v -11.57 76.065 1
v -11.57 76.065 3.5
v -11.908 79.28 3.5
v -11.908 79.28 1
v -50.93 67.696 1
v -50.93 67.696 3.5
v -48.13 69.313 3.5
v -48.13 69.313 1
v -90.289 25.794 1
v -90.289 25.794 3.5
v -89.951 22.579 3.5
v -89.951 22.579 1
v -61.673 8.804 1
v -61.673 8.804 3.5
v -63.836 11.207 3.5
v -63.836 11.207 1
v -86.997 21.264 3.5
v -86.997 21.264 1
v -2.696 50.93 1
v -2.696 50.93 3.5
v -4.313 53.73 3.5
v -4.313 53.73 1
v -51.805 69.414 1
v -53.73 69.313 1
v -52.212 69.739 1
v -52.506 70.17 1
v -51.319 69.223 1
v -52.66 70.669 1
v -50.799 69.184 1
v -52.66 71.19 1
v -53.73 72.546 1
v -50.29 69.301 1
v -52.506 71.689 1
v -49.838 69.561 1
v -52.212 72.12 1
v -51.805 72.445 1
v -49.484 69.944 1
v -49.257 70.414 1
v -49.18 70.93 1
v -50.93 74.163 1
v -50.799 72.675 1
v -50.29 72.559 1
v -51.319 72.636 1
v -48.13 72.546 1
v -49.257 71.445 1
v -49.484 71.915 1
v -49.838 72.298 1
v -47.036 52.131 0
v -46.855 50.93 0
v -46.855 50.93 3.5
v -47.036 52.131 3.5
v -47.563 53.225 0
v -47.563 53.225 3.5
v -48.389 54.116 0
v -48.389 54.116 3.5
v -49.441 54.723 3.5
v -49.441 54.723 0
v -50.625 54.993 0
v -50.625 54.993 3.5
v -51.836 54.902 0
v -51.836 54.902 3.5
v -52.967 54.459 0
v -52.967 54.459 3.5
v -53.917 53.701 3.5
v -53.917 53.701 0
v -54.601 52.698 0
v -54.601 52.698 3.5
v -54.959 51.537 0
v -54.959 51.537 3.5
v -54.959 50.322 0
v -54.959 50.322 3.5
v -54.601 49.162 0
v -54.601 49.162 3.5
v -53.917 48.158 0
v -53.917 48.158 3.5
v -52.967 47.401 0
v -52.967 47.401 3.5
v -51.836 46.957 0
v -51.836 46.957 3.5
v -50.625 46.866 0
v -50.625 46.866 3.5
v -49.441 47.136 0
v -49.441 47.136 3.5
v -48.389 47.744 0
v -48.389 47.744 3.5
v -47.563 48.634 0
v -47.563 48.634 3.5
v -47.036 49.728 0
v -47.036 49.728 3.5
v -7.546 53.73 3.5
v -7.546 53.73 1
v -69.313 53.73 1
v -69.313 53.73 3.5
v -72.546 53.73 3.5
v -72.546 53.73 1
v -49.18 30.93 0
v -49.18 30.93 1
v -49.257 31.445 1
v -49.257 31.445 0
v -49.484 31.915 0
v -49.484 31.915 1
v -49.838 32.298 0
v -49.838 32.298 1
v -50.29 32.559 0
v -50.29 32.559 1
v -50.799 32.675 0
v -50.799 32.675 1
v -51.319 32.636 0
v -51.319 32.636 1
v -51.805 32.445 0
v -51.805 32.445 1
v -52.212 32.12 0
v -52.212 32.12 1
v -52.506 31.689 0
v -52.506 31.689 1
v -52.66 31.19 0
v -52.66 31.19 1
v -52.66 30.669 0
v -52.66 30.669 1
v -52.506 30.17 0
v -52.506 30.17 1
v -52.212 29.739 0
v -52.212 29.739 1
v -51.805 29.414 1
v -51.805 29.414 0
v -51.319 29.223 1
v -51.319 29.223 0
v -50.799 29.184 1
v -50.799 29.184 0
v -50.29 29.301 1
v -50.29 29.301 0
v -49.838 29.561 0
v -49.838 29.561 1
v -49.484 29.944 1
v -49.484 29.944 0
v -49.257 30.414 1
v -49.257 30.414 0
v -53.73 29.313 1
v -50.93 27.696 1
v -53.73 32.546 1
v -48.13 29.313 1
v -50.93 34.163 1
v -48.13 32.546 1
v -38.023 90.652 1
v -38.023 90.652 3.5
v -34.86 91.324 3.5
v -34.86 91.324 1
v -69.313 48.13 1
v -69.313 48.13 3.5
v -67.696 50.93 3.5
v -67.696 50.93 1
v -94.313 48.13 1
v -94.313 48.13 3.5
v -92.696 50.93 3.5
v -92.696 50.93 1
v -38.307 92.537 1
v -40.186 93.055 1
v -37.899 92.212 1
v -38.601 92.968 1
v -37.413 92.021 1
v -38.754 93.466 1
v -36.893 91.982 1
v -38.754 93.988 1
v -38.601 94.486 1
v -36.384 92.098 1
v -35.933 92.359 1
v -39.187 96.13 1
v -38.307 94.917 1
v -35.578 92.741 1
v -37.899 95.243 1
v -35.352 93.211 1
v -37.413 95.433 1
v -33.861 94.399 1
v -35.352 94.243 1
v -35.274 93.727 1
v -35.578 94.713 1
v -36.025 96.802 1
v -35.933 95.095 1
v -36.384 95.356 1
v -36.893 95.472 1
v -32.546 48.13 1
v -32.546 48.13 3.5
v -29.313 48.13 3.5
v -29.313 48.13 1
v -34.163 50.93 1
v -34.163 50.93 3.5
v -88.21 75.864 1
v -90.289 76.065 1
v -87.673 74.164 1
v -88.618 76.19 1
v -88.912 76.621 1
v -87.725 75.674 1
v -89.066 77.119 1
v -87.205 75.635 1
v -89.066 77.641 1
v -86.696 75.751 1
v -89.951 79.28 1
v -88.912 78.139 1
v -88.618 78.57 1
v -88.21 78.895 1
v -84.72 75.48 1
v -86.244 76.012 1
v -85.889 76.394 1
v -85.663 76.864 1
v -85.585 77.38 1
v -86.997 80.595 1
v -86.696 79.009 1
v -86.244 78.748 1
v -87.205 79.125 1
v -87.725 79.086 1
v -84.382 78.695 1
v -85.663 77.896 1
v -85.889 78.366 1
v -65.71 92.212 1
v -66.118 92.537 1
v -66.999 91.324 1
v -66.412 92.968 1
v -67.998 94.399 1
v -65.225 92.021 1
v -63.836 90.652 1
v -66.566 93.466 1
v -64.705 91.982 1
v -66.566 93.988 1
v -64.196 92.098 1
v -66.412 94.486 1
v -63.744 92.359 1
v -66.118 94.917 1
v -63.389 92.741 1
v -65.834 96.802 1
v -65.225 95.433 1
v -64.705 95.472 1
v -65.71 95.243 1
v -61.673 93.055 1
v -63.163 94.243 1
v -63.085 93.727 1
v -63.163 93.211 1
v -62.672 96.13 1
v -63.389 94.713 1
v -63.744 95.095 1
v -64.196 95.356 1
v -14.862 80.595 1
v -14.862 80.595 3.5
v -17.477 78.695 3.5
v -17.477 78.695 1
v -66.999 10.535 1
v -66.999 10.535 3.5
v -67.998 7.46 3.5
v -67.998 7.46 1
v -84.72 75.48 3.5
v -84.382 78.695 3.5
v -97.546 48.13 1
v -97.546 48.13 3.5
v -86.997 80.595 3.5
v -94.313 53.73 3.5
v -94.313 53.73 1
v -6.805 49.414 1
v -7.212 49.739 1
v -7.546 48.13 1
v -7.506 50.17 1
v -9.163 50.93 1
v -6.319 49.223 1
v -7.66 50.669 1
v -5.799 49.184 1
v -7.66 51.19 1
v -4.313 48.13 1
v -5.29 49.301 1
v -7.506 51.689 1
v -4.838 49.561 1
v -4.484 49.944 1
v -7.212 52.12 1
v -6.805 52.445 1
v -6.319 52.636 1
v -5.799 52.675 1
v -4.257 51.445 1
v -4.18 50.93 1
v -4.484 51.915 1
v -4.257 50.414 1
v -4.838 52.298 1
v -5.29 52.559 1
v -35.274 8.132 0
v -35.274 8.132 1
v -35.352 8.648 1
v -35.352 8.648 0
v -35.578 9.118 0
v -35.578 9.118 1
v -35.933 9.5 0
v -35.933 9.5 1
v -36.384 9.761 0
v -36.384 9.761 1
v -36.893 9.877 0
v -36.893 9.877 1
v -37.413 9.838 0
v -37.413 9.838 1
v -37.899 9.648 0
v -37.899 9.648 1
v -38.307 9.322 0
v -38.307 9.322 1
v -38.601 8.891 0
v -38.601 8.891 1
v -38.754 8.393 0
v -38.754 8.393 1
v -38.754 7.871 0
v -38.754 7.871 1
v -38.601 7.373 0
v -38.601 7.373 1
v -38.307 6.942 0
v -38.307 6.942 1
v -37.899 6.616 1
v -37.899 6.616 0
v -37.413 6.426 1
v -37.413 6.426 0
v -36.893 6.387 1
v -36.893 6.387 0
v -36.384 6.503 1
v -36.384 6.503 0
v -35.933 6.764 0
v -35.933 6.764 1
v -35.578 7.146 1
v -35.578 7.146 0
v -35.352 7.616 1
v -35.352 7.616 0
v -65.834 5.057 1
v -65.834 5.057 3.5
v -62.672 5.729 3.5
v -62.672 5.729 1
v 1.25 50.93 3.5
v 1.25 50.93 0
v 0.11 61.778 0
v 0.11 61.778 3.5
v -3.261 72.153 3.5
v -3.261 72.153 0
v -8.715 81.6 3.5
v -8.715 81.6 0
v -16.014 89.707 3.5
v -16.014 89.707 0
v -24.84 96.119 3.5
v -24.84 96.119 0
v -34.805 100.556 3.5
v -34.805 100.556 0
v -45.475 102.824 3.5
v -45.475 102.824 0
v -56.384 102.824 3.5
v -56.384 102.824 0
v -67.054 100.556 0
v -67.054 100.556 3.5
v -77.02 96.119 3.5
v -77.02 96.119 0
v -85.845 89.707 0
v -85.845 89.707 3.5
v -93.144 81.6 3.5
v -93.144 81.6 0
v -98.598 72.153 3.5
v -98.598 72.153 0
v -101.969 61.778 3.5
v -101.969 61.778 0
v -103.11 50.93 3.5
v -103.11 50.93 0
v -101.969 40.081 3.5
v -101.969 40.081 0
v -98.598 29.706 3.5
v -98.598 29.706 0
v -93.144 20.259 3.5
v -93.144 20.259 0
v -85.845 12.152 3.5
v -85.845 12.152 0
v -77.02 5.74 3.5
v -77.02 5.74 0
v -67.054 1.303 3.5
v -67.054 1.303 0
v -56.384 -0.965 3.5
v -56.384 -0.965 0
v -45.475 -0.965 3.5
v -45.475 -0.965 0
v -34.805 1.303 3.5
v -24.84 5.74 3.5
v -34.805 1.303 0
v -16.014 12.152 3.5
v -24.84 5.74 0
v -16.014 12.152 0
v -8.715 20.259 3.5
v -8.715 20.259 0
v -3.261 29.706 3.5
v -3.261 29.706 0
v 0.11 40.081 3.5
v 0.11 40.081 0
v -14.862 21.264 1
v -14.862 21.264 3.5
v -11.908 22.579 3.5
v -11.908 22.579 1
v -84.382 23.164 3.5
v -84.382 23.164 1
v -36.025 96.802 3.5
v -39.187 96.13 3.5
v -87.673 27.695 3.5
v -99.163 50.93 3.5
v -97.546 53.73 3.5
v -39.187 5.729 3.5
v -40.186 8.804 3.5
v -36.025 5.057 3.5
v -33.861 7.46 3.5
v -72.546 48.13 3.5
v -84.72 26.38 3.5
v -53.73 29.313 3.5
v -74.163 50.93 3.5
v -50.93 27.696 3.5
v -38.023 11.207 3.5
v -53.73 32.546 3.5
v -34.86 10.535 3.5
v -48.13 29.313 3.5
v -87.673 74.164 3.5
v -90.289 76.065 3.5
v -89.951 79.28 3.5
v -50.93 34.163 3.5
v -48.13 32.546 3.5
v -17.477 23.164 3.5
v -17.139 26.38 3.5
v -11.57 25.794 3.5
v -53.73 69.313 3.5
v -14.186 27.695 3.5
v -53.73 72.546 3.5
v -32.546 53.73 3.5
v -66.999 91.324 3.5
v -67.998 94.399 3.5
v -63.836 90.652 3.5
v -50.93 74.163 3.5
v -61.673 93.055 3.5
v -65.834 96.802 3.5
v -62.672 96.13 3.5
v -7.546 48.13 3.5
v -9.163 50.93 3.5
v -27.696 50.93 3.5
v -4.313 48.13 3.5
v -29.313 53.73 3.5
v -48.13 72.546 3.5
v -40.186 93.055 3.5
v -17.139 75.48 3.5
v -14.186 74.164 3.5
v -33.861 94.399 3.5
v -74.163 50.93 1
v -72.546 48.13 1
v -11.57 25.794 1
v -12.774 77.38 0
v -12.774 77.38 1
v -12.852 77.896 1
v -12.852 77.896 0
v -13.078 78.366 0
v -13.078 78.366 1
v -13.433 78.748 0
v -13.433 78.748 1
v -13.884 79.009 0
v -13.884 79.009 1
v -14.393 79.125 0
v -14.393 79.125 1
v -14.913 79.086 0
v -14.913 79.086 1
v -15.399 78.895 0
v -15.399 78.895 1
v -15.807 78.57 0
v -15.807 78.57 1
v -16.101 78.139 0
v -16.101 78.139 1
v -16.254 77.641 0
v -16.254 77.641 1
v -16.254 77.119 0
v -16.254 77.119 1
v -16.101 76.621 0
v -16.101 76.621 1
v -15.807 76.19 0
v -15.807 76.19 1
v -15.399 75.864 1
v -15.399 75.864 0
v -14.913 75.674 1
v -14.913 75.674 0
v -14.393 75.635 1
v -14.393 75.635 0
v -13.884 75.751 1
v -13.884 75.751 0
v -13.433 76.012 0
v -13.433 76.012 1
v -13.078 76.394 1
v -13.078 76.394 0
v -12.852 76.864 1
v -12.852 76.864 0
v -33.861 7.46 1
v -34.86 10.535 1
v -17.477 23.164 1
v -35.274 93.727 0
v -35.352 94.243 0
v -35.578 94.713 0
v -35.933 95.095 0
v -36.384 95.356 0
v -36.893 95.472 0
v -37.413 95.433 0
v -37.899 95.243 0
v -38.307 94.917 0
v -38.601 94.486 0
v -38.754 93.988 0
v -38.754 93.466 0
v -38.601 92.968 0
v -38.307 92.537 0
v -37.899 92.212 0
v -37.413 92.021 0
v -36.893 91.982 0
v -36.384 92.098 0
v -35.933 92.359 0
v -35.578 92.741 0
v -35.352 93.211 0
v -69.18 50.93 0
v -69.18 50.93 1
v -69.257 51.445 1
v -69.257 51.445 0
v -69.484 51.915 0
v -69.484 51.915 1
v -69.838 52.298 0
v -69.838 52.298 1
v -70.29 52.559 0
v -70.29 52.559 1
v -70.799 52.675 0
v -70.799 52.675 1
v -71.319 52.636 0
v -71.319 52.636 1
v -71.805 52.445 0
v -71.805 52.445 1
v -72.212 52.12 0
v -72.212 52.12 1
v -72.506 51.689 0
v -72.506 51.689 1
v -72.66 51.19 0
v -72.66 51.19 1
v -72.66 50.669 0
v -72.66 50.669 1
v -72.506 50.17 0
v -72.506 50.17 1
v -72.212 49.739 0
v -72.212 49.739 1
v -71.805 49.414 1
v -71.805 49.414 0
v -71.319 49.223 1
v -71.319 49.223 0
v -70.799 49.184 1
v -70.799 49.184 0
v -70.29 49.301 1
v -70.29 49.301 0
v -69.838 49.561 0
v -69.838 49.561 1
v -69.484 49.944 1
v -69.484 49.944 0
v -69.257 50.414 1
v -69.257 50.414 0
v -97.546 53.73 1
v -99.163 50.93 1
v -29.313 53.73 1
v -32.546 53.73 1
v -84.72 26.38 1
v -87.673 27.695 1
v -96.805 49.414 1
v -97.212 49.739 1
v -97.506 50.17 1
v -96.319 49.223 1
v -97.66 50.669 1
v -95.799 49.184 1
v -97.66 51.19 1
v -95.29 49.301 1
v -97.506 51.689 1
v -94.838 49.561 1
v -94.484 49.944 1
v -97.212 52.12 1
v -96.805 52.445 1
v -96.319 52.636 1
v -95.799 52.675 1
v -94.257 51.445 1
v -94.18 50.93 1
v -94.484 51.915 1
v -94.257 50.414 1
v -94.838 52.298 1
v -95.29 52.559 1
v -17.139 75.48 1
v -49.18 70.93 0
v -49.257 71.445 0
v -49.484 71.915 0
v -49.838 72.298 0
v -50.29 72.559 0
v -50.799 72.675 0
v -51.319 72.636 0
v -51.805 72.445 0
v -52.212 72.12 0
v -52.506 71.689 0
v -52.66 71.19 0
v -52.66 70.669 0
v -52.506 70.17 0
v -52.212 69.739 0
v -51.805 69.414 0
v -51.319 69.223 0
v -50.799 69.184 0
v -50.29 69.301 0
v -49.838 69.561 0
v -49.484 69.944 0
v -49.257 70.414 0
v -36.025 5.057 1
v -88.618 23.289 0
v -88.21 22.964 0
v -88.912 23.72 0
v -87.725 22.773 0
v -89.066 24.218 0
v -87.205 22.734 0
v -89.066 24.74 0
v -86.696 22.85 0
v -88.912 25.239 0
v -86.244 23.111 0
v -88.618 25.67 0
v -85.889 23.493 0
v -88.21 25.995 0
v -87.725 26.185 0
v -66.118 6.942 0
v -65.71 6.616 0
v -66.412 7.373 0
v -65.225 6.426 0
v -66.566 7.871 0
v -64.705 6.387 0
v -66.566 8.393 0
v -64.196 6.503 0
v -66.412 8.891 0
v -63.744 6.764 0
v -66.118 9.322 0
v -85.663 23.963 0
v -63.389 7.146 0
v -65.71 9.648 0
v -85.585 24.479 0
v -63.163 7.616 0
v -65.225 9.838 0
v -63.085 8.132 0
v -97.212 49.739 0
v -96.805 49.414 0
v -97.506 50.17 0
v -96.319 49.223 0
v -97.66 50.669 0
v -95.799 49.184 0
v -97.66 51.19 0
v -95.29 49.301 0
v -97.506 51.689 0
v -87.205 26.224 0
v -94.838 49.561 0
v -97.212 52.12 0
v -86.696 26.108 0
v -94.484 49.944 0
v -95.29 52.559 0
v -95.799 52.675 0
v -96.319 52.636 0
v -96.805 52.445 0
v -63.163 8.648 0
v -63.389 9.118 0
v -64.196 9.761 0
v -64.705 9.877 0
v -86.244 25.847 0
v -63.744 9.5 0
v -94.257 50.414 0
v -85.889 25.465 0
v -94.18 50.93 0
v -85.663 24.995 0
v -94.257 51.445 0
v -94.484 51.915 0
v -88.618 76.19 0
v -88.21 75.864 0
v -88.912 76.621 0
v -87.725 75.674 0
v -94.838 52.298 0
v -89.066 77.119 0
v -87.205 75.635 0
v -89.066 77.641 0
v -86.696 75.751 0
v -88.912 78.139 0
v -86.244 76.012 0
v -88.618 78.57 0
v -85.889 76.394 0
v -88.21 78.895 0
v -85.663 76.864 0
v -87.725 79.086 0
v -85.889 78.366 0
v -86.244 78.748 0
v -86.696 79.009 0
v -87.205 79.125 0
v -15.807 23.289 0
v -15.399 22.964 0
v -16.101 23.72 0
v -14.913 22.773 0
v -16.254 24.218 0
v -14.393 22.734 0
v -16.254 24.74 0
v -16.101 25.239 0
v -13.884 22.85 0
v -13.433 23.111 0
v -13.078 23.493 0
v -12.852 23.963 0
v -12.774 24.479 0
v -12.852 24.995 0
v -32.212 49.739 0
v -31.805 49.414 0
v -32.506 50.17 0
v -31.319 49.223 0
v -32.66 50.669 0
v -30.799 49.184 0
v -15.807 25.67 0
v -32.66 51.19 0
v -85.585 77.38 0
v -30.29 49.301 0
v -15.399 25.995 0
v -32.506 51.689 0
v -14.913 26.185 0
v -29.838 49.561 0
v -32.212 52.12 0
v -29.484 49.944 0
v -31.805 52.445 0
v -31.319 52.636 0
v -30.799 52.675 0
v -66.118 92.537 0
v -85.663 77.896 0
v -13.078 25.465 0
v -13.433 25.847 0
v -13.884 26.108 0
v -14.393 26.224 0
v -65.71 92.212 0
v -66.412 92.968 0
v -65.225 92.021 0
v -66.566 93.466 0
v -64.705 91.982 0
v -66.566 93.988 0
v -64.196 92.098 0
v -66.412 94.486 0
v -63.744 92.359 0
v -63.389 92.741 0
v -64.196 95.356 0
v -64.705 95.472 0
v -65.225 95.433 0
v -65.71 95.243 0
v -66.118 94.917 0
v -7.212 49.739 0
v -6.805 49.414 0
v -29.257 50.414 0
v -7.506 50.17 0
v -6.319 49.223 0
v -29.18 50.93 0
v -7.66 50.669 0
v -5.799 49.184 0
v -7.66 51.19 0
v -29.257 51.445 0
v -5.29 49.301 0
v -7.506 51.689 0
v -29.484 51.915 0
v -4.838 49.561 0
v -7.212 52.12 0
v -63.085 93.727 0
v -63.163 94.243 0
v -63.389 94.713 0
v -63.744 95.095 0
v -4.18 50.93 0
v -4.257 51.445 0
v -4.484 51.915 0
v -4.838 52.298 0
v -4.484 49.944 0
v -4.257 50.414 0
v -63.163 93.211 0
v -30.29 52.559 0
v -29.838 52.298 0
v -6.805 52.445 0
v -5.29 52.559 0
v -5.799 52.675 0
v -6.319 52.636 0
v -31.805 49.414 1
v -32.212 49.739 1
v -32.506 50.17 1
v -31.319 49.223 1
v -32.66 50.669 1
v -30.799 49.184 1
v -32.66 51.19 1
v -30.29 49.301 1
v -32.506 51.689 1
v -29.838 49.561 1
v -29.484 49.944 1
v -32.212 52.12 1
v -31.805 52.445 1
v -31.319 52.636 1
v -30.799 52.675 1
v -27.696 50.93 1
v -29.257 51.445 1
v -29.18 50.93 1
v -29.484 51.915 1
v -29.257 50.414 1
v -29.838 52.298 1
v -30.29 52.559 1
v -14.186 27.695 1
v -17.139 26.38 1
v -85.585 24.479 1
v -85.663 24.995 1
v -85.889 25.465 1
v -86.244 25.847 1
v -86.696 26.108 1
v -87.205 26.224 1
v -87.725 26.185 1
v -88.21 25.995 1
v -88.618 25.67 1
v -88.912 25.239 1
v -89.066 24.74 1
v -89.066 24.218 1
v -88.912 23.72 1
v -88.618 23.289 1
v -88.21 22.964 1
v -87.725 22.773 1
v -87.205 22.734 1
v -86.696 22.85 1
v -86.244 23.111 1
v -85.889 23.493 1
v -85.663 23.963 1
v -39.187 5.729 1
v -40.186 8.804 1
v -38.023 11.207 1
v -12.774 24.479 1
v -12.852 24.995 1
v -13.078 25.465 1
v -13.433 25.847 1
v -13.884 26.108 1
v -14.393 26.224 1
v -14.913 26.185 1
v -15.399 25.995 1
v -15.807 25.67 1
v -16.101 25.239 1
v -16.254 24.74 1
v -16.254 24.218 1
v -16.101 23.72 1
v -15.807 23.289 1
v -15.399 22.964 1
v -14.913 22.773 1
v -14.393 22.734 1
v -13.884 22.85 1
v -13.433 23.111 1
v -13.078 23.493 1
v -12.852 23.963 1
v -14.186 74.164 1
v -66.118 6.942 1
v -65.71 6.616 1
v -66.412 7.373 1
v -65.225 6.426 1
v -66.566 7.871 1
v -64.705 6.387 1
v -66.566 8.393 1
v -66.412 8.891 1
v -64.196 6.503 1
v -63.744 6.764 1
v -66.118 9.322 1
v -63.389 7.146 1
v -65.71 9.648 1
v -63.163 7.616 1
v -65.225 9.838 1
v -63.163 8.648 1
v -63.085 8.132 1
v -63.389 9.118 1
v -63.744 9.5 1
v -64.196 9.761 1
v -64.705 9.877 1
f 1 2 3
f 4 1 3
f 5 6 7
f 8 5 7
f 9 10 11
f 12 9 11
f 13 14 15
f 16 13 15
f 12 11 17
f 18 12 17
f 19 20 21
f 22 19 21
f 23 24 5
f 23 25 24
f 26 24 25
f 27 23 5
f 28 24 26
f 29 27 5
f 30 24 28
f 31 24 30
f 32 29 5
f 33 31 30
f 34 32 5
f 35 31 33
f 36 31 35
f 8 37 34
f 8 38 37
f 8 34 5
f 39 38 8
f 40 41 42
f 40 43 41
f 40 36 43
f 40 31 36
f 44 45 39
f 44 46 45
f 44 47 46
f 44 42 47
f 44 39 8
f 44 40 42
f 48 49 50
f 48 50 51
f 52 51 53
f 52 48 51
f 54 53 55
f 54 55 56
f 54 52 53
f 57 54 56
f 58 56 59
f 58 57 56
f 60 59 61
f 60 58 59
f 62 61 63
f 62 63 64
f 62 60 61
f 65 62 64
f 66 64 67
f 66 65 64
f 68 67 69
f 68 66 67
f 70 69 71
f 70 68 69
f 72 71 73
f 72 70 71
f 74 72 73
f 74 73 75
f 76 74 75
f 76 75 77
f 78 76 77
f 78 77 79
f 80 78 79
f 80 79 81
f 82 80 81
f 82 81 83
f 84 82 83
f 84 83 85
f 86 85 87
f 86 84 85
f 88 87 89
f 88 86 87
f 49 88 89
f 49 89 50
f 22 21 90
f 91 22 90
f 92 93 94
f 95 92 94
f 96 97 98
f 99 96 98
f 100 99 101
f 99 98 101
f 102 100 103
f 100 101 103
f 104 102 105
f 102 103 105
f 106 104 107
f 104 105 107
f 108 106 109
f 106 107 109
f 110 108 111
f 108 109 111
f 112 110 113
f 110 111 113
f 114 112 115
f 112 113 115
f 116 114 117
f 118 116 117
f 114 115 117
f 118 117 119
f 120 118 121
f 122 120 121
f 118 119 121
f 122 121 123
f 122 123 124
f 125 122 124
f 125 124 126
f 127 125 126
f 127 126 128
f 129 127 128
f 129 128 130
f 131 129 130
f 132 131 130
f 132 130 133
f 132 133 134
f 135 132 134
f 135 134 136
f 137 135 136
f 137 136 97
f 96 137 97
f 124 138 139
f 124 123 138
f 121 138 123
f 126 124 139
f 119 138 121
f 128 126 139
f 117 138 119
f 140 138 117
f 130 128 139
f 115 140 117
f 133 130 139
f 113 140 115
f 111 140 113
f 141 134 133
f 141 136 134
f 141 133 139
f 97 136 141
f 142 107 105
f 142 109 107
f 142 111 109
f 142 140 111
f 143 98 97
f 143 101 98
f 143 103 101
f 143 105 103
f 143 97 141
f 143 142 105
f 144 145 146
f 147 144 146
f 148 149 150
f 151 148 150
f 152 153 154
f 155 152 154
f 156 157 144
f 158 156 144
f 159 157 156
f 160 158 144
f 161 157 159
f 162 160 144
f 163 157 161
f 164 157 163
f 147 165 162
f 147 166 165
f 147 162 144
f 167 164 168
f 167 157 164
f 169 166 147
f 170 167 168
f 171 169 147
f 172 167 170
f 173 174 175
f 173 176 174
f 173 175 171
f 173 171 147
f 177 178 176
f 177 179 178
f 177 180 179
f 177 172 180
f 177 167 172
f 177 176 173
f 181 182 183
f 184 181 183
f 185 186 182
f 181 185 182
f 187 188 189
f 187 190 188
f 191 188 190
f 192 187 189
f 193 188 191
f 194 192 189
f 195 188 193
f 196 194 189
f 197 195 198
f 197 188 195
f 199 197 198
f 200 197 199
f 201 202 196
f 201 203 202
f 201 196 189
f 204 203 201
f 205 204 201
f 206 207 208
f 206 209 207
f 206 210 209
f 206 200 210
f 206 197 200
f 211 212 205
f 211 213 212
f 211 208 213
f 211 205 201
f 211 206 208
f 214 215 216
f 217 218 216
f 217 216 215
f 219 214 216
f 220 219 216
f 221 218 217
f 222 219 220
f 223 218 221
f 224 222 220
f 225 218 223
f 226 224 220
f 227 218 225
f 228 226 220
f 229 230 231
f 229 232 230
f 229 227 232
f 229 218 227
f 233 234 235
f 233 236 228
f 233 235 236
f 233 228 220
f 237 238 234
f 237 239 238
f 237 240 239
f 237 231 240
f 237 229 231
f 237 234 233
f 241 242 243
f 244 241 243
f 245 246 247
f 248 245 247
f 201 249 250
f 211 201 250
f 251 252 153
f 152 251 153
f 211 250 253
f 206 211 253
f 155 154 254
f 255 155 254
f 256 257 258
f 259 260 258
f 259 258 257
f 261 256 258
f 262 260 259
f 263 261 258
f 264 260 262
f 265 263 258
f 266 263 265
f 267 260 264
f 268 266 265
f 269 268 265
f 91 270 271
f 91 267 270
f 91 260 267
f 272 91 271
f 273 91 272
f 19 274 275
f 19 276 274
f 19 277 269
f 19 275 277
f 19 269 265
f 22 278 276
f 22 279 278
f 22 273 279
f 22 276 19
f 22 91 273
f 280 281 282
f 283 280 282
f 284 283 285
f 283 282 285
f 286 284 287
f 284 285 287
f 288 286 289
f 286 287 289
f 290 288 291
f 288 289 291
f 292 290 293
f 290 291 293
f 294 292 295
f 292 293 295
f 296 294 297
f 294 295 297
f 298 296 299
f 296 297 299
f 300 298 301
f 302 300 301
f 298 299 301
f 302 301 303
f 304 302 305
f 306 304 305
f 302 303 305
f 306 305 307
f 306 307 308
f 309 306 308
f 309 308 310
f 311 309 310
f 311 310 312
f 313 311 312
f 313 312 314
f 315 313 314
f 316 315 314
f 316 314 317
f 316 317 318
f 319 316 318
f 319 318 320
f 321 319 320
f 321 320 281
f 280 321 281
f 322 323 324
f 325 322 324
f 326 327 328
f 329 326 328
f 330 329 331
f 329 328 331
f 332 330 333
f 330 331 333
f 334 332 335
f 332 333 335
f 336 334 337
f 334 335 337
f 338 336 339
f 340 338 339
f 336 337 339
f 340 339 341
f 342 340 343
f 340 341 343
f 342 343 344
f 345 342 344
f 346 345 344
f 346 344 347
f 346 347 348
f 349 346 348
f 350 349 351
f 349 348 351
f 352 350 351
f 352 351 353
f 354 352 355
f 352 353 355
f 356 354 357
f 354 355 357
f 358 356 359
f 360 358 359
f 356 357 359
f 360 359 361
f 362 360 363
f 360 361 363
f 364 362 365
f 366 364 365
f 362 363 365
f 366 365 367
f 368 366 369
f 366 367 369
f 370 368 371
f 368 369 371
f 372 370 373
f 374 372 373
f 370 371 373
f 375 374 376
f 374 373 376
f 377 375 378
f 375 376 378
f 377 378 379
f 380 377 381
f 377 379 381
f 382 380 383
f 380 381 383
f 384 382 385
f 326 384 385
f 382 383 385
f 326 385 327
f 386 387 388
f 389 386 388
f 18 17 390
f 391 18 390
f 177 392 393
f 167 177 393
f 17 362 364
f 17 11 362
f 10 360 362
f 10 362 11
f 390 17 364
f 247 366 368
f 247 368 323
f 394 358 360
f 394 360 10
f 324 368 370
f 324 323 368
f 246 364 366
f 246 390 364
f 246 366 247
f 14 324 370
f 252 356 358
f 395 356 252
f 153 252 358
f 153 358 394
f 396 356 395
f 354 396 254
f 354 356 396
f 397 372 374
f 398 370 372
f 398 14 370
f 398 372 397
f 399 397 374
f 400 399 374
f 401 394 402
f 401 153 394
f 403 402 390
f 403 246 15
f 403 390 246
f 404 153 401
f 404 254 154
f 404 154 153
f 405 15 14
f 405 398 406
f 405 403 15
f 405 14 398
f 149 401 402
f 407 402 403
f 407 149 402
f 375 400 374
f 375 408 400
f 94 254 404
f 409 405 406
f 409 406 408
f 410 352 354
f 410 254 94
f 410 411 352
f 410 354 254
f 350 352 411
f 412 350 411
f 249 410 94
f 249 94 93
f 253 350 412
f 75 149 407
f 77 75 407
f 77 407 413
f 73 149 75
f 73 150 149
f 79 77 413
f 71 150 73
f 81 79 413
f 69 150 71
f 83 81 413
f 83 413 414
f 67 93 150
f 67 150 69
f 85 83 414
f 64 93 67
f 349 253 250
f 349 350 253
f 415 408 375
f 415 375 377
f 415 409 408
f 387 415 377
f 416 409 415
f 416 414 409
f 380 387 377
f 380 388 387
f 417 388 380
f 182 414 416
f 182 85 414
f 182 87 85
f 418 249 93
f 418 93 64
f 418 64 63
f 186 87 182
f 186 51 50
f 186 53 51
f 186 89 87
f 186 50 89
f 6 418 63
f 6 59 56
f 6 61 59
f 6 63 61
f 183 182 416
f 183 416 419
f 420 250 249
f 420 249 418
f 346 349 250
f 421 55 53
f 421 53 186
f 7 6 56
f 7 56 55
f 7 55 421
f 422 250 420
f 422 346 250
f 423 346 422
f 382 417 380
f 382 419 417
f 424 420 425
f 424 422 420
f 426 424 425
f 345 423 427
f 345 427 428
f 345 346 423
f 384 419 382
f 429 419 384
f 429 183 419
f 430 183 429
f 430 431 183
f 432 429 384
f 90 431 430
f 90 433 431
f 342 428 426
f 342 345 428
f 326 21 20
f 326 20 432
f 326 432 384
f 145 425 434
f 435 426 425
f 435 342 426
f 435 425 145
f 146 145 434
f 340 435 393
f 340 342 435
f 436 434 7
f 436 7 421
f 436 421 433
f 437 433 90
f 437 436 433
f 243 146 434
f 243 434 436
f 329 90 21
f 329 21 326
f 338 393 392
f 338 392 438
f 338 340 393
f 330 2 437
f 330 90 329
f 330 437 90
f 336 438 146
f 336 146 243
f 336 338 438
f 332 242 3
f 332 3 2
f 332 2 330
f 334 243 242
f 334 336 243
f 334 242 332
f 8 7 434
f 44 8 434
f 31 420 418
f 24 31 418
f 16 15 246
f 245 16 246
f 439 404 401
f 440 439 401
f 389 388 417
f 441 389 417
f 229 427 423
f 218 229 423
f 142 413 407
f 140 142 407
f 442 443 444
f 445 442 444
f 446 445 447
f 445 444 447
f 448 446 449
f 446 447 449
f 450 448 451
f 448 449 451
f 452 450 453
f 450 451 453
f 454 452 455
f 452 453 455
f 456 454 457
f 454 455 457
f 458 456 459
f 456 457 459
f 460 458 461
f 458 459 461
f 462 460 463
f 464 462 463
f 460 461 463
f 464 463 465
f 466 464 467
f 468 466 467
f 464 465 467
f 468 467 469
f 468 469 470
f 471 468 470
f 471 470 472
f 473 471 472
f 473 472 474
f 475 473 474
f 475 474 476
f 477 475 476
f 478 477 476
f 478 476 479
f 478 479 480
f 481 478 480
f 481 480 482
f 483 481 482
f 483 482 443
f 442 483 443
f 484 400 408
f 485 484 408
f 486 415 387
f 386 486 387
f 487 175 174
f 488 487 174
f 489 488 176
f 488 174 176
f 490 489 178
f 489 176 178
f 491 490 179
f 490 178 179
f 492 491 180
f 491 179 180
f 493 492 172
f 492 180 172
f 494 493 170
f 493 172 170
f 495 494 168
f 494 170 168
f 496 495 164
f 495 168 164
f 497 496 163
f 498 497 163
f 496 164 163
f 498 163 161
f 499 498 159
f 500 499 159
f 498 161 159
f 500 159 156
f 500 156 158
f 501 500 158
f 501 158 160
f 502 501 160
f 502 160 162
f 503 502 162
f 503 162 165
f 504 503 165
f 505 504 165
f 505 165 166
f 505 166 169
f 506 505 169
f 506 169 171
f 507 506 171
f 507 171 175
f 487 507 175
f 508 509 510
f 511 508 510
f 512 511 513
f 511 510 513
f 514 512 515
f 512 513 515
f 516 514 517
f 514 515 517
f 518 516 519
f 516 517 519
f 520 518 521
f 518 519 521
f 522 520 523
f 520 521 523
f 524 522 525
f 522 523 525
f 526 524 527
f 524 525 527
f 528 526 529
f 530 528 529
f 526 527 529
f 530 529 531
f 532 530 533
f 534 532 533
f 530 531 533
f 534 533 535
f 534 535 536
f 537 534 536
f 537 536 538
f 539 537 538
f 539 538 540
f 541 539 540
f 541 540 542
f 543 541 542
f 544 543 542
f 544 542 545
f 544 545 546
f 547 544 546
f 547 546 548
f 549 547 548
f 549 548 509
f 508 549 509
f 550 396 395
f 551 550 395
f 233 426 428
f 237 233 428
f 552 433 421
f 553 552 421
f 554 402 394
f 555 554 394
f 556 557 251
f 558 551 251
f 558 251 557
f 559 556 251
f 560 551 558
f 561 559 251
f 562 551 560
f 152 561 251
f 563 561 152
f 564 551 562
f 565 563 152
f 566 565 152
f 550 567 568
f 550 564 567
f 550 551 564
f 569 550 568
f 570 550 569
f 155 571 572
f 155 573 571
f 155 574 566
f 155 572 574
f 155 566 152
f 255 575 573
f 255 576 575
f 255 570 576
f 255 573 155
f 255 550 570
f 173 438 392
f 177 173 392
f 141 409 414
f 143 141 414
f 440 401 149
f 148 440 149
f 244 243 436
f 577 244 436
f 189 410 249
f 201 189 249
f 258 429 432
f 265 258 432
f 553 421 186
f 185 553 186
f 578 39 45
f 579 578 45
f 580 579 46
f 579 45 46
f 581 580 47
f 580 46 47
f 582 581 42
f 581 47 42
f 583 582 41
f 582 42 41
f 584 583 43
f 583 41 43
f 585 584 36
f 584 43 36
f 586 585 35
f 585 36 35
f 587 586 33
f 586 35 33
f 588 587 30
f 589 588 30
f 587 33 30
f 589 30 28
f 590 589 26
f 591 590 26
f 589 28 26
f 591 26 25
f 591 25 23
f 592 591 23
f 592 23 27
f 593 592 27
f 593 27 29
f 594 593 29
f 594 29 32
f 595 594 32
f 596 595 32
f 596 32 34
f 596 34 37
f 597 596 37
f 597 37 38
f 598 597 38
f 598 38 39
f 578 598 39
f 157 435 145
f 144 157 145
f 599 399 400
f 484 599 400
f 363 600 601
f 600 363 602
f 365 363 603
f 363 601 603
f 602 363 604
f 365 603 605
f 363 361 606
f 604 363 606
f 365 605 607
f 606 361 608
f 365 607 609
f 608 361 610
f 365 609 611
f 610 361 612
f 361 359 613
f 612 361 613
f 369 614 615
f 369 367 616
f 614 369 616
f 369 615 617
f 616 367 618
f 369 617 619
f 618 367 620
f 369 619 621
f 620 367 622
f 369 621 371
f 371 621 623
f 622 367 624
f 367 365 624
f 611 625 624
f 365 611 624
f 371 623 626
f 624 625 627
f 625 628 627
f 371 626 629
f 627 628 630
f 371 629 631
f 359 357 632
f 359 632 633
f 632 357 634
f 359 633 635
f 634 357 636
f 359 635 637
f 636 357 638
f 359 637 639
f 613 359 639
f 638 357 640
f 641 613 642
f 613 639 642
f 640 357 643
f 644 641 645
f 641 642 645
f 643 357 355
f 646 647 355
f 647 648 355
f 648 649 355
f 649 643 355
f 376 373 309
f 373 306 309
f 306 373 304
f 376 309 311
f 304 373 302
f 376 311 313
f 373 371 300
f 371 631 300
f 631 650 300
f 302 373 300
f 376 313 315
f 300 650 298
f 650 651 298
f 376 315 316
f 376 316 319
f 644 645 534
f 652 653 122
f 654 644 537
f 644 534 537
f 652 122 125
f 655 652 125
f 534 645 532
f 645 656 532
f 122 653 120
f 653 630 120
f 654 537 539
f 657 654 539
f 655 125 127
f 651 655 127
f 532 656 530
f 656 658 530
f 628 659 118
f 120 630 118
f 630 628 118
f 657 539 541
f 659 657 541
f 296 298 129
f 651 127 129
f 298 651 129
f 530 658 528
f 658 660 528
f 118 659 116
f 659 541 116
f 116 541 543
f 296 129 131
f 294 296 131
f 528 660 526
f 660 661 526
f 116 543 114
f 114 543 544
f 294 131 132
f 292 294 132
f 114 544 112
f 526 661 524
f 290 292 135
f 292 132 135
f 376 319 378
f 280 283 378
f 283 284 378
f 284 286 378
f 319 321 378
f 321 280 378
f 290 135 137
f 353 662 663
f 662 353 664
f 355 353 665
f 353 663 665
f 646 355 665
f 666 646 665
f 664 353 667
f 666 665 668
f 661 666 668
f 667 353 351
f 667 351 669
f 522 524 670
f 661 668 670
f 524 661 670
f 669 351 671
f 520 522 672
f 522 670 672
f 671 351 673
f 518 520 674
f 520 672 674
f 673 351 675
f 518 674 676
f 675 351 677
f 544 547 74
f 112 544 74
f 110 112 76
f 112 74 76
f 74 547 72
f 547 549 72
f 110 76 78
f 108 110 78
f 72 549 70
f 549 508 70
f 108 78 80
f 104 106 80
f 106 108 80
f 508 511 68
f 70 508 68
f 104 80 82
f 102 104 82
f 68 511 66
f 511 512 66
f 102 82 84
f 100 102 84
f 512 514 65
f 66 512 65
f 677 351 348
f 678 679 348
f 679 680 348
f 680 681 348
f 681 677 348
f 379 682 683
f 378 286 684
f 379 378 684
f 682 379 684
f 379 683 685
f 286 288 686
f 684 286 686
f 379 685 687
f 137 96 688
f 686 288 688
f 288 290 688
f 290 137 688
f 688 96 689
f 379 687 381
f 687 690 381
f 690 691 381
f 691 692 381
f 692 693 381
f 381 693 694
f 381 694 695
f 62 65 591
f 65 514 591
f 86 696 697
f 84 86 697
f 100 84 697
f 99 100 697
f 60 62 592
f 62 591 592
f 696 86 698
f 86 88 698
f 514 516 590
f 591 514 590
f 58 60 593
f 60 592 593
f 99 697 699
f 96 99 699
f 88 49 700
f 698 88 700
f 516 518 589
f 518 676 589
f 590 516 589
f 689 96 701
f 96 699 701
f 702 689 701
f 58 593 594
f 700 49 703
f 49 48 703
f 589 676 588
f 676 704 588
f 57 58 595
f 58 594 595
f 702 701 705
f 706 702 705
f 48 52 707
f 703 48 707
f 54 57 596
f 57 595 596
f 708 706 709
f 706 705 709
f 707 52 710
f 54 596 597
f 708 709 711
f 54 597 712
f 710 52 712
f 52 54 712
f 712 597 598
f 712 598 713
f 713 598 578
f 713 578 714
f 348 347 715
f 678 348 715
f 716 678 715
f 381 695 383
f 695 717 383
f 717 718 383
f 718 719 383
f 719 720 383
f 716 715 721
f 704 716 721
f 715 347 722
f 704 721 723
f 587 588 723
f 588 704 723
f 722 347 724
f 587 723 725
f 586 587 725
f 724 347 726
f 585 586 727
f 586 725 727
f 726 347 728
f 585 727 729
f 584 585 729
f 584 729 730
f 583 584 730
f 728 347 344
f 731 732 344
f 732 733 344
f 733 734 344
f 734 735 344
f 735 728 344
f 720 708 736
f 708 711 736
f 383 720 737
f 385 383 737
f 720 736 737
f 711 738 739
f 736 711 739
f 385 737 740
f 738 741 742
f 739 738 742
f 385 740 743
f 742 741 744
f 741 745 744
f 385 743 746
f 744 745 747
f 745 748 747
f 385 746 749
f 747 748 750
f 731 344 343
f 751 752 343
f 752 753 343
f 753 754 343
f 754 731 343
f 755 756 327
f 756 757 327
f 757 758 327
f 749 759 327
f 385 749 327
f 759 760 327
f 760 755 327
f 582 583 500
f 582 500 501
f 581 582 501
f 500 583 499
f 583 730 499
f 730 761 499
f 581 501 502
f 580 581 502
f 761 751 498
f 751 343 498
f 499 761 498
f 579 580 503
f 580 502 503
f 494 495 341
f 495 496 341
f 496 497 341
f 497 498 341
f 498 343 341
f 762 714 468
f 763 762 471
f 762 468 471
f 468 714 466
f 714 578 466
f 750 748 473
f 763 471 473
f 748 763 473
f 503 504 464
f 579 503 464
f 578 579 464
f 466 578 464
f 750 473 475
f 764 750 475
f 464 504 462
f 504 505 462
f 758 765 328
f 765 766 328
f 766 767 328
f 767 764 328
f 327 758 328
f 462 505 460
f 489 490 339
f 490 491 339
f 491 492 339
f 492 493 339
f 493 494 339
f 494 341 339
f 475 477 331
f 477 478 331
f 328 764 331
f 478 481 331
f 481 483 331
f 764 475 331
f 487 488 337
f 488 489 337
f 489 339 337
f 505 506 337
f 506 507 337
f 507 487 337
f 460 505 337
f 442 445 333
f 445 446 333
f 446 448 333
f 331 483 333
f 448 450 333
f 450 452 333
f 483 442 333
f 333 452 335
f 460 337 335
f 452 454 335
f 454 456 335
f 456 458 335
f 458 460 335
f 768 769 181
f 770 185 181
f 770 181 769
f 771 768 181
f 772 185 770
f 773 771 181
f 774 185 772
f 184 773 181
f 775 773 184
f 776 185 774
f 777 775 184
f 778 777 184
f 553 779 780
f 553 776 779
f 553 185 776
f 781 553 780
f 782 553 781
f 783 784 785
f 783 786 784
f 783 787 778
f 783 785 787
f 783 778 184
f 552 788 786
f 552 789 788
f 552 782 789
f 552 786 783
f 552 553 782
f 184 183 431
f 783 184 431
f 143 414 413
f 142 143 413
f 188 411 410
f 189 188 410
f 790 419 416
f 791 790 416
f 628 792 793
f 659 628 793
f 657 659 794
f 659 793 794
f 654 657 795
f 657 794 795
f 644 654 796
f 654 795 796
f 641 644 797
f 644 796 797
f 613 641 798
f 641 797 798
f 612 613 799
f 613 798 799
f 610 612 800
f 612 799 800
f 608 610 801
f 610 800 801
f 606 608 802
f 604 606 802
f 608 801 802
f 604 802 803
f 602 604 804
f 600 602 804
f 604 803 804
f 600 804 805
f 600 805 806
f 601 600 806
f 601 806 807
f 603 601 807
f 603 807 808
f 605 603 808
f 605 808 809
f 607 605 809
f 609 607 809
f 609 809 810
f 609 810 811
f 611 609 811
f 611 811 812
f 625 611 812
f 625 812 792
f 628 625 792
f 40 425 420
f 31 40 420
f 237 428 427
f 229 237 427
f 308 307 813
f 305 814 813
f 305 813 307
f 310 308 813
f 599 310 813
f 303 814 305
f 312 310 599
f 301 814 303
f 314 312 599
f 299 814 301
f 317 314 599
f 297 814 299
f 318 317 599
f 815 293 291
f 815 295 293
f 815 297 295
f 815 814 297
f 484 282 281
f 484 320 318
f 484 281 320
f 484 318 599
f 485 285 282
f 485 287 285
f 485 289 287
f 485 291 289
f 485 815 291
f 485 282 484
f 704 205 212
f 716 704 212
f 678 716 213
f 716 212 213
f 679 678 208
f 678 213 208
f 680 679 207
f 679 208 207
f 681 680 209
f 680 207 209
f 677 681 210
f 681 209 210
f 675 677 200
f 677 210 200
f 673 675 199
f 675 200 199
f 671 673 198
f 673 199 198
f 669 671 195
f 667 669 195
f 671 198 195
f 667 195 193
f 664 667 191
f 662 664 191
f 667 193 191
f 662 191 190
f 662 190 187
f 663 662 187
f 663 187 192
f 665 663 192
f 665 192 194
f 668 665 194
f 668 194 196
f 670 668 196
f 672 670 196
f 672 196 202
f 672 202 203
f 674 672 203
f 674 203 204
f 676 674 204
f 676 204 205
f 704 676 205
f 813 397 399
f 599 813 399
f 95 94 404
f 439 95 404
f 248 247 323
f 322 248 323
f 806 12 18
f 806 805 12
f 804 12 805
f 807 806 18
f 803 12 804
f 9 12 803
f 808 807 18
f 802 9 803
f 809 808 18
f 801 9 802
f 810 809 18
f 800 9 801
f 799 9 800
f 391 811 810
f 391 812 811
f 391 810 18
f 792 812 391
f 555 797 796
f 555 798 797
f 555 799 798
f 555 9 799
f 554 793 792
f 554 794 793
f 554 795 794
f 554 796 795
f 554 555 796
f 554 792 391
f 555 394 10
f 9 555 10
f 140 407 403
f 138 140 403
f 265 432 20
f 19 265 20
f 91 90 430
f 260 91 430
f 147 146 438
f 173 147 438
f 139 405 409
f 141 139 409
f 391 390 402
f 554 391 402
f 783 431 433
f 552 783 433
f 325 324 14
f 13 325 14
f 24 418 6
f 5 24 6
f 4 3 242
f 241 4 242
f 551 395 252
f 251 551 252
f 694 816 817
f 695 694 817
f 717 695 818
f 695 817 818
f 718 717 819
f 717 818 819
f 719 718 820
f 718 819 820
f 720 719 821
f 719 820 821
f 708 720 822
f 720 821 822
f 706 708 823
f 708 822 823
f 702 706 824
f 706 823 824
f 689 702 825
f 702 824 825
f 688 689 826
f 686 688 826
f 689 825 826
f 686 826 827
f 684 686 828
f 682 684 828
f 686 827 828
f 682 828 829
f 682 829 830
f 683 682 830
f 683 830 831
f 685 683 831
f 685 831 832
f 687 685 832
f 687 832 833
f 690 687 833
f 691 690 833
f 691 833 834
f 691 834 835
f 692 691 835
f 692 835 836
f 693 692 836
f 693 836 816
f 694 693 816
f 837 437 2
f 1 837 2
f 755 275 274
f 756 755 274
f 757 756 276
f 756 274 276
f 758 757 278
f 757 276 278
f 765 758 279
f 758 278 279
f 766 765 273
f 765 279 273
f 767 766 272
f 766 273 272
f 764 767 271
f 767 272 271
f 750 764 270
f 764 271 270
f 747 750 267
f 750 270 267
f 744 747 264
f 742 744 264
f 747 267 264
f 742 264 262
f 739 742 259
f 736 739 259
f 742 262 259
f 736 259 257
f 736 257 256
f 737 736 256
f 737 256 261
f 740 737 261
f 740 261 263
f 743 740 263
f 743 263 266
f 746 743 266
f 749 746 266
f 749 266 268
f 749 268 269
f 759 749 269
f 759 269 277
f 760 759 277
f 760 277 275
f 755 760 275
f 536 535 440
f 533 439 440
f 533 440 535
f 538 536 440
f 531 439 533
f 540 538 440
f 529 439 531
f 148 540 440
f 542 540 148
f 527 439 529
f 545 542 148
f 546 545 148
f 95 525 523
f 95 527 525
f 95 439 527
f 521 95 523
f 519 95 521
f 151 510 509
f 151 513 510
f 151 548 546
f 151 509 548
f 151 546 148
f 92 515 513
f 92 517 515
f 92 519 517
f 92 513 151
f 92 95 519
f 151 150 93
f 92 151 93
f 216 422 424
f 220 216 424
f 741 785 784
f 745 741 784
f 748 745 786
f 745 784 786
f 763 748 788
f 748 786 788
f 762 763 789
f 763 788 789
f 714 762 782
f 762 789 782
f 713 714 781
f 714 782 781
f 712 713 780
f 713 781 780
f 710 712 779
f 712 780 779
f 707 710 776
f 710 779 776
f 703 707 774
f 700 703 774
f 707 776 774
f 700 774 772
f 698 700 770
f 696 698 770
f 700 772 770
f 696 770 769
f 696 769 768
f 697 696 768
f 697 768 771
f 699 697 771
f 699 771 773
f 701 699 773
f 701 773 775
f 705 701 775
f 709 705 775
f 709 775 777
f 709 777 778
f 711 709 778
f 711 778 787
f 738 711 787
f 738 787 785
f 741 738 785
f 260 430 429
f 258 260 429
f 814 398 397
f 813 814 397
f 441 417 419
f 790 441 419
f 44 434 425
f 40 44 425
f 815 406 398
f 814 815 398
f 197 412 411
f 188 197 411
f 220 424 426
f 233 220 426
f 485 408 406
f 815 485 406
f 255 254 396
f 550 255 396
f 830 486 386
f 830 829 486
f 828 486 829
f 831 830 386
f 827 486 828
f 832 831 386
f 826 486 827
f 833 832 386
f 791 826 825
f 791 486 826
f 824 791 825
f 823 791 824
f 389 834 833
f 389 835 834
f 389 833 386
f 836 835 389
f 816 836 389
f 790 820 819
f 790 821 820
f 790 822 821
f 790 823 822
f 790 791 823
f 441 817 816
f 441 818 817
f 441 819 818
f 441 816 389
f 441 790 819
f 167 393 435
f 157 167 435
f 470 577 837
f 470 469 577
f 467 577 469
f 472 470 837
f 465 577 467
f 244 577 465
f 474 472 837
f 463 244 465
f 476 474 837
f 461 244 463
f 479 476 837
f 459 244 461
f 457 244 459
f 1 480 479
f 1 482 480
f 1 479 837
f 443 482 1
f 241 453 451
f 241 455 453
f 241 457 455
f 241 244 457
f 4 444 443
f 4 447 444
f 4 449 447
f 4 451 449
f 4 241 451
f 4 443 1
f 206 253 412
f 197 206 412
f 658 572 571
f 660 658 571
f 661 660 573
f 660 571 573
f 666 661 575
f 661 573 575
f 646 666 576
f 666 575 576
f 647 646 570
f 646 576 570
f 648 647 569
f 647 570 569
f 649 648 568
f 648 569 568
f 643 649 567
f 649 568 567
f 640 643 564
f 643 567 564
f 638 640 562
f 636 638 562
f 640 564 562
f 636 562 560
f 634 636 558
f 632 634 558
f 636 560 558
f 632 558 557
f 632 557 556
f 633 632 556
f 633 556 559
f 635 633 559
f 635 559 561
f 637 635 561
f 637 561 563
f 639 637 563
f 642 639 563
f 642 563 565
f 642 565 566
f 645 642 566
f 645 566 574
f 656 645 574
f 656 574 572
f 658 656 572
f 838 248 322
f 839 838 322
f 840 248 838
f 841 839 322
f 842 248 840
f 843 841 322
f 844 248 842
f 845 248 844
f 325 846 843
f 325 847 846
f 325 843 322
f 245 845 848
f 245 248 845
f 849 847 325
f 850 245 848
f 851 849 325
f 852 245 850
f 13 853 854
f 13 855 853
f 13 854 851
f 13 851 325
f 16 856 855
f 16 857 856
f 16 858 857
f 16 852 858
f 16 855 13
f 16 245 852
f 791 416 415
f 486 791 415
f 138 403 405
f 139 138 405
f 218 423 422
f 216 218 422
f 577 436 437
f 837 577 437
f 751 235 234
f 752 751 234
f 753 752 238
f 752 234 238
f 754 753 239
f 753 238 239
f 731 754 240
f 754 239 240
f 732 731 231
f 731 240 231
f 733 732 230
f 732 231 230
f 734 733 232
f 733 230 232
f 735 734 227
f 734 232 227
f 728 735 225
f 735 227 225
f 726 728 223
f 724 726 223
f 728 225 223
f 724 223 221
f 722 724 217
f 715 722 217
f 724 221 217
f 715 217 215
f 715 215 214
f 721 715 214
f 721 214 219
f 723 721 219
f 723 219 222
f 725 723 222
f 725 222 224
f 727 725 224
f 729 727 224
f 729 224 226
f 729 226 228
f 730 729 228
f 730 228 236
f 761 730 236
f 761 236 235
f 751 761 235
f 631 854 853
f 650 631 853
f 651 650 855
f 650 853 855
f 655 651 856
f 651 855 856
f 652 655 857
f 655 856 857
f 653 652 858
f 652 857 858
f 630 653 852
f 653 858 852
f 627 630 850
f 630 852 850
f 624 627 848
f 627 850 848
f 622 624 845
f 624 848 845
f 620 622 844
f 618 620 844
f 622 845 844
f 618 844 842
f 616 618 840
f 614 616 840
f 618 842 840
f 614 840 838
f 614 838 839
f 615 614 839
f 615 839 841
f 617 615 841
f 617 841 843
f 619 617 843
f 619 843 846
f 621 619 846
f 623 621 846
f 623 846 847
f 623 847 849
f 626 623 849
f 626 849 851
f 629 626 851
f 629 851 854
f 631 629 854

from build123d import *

# Parameters (mm, degrees)
SKETCH2_R           = 52.18
SKETCH2_R_2         = 4.075
BOSS_EXTRUDE2_DEPTH = 3.5
CUT_EXTRUDE1_DEPTH  = 2.5
SKETCH4_R           = 1.75
CUT_EXTRUDE2_DEPTH  = 146.860967066


with BuildPart() as part:
    # Sketch2 → Boss-Extrude2 (new body)
    with BuildSketch(Plane.XY):
        with Locations((-50.929581789, 50.929581789)):
            Circle(SKETCH2_R)
        with Locations((-50.929581789, 50.929581789)):
            Circle(SKETCH2_R_2, mode=Mode.SUBTRACT)
    extrude(amount=BOSS_EXTRUDE2_DEPTH)

    # Sketch3 → Cut-Extrude1 (cut)
    with BuildSketch(Plane.XY.offset(3.5)):
        Polygon((-53.729581789, 32.546162543), (-53.729581789, 29.313001036), (-50.929581789, 27.696420282), (-48.129581789, 29.313001036), (-48.129581789, 32.546162543), (-50.929581789, 34.162743297), align=None)
        Polygon((-32.546162543, 48.129581789), (-29.313001036, 48.129581789), (-27.696420282, 50.929581789), (-29.313001036, 53.729581789), (-32.546162543, 53.729581789), (-34.162743297, 50.929581789), align=None)
        Polygon((-7.546162543, 48.129581789), (-4.313001036, 48.129581789), (-2.696420282, 50.929581789), (-4.313001036, 53.729581789), (-7.546162543, 53.729581789), (-9.162743297, 50.929581789), align=None)
        Polygon((-69.313001036, 53.729581789), (-72.546162543, 53.729581789), (-74.162743297, 50.929581789), (-72.546162543, 48.129581789), (-69.313001036, 48.129581789), (-67.696420282, 50.929581789), align=None)
        Polygon((-48.129581789, 69.313001036), (-48.129581789, 72.546162543), (-50.929581789, 74.162743297), (-53.729581789, 72.546162543), (-53.729581789, 69.313001036), (-50.929581789, 67.696420282), align=None)
        Polygon((-17.477457052, 23.164200178), (-14.861774446, 21.263795526), (-11.908134437, 22.578840784), (-11.570177034, 25.794290694), (-14.185859639, 27.694695347), (-17.139499648, 26.379650089), align=None)
        Polygon((-40.186326214, 8.804250632), (-39.187224362, 5.729331312), (-36.024715191, 5.057119236), (-33.861307871, 7.45982648), (-34.860409723, 10.5347458), (-38.022918894, 11.206957876), align=None)
        Polygon((-66.998753856, 10.5347458), (-67.997855708, 7.45982648), (-65.834448388, 5.057119236), (-62.671939216, 5.729331312), (-61.672837365, 8.804250632), (-63.836244685, 11.206957876), align=None)
        Polygon((-87.67330394, 27.694695347), (-90.288986545, 25.794290694), (-89.951029141, 22.578840784), (-86.997389132, 21.263795526), (-84.381706527, 23.164200178), (-84.719663931, 26.379650089), align=None)
        Polygon((-94.313001036, 53.729581789), (-97.546162543, 53.729581789), (-99.162743297, 50.929581789), (-97.546162543, 48.129581789), (-94.313001036, 48.129581789), (-92.696420282, 50.929581789), align=None)
        Polygon((-84.381706527, 78.694963401), (-86.997389132, 80.595368053), (-89.951029141, 79.280322795), (-90.288986545, 76.064872885), (-87.67330394, 74.164468232), (-84.719663931, 75.47951349), align=None)
        Polygon((-61.672837365, 93.054912947), (-62.671939216, 96.129832267), (-65.834448388, 96.802044343), (-67.997855708, 94.399337098), (-66.998753856, 91.324417778), (-63.836244685, 90.652205703), align=None)
        Polygon((-34.860409723, 91.324417778), (-33.861307871, 94.399337098), (-36.024715191, 96.802044343), (-39.187224362, 96.129832267), (-40.186326214, 93.054912947), (-38.022918894, 90.652205703), align=None)
        Polygon((-14.185859639, 74.164468232), (-11.570177034, 76.064872885), (-11.908134437, 79.280322795), (-14.861774446, 80.595368053), (-17.477457052, 78.694963401), (-17.139499648, 75.47951349), align=None)
    extrude(amount=-CUT_EXTRUDE1_DEPTH, mode=Mode.SUBTRACT)

    # Sketch4 → Cut-Extrude2 (cut, through all)
    with BuildSketch(Plane.XY.offset(3.5)):
        with Locations((-30.929581789, 50.929581789)):
            Circle(SKETCH4_R)
        with Locations((-5.929581789, 50.929581789)):
            Circle(SKETCH4_R)
        with Locations((-50.929581789, 30.929581789)):
            Circle(SKETCH4_R)
        with Locations((-70.929581789, 50.929581789)):
            Circle(SKETCH4_R)
        with Locations((-50.929581789, 70.929581789)):
            Circle(SKETCH4_R)
        with Locations((-14.523817043, 24.479245436)):
            Circle(SKETCH4_R)
        with Locations((-37.023817043, 8.132038556)):
            Circle(SKETCH4_R)
        with Locations((-64.835346536, 8.132038556)):
            Circle(SKETCH4_R)
        with Locations((-87.335346536, 24.479245436)):
            Circle(SKETCH4_R)
        with Locations((-95.929581789, 50.929581789)):
            Circle(SKETCH4_R)
        with Locations((-87.335346536, 77.379918143)):
            Circle(SKETCH4_R)
        with Locations((-64.835346536, 93.727125023)):
            Circle(SKETCH4_R)
        with Locations((-37.023817043, 93.727125023)):
            Circle(SKETCH4_R)
        with Locations((-14.523817043, 77.379918143)):
            Circle(SKETCH4_R)
    extrude(amount=-CUT_EXTRUDE2_DEPTH, mode=Mode.SUBTRACT)


solid = part.part
